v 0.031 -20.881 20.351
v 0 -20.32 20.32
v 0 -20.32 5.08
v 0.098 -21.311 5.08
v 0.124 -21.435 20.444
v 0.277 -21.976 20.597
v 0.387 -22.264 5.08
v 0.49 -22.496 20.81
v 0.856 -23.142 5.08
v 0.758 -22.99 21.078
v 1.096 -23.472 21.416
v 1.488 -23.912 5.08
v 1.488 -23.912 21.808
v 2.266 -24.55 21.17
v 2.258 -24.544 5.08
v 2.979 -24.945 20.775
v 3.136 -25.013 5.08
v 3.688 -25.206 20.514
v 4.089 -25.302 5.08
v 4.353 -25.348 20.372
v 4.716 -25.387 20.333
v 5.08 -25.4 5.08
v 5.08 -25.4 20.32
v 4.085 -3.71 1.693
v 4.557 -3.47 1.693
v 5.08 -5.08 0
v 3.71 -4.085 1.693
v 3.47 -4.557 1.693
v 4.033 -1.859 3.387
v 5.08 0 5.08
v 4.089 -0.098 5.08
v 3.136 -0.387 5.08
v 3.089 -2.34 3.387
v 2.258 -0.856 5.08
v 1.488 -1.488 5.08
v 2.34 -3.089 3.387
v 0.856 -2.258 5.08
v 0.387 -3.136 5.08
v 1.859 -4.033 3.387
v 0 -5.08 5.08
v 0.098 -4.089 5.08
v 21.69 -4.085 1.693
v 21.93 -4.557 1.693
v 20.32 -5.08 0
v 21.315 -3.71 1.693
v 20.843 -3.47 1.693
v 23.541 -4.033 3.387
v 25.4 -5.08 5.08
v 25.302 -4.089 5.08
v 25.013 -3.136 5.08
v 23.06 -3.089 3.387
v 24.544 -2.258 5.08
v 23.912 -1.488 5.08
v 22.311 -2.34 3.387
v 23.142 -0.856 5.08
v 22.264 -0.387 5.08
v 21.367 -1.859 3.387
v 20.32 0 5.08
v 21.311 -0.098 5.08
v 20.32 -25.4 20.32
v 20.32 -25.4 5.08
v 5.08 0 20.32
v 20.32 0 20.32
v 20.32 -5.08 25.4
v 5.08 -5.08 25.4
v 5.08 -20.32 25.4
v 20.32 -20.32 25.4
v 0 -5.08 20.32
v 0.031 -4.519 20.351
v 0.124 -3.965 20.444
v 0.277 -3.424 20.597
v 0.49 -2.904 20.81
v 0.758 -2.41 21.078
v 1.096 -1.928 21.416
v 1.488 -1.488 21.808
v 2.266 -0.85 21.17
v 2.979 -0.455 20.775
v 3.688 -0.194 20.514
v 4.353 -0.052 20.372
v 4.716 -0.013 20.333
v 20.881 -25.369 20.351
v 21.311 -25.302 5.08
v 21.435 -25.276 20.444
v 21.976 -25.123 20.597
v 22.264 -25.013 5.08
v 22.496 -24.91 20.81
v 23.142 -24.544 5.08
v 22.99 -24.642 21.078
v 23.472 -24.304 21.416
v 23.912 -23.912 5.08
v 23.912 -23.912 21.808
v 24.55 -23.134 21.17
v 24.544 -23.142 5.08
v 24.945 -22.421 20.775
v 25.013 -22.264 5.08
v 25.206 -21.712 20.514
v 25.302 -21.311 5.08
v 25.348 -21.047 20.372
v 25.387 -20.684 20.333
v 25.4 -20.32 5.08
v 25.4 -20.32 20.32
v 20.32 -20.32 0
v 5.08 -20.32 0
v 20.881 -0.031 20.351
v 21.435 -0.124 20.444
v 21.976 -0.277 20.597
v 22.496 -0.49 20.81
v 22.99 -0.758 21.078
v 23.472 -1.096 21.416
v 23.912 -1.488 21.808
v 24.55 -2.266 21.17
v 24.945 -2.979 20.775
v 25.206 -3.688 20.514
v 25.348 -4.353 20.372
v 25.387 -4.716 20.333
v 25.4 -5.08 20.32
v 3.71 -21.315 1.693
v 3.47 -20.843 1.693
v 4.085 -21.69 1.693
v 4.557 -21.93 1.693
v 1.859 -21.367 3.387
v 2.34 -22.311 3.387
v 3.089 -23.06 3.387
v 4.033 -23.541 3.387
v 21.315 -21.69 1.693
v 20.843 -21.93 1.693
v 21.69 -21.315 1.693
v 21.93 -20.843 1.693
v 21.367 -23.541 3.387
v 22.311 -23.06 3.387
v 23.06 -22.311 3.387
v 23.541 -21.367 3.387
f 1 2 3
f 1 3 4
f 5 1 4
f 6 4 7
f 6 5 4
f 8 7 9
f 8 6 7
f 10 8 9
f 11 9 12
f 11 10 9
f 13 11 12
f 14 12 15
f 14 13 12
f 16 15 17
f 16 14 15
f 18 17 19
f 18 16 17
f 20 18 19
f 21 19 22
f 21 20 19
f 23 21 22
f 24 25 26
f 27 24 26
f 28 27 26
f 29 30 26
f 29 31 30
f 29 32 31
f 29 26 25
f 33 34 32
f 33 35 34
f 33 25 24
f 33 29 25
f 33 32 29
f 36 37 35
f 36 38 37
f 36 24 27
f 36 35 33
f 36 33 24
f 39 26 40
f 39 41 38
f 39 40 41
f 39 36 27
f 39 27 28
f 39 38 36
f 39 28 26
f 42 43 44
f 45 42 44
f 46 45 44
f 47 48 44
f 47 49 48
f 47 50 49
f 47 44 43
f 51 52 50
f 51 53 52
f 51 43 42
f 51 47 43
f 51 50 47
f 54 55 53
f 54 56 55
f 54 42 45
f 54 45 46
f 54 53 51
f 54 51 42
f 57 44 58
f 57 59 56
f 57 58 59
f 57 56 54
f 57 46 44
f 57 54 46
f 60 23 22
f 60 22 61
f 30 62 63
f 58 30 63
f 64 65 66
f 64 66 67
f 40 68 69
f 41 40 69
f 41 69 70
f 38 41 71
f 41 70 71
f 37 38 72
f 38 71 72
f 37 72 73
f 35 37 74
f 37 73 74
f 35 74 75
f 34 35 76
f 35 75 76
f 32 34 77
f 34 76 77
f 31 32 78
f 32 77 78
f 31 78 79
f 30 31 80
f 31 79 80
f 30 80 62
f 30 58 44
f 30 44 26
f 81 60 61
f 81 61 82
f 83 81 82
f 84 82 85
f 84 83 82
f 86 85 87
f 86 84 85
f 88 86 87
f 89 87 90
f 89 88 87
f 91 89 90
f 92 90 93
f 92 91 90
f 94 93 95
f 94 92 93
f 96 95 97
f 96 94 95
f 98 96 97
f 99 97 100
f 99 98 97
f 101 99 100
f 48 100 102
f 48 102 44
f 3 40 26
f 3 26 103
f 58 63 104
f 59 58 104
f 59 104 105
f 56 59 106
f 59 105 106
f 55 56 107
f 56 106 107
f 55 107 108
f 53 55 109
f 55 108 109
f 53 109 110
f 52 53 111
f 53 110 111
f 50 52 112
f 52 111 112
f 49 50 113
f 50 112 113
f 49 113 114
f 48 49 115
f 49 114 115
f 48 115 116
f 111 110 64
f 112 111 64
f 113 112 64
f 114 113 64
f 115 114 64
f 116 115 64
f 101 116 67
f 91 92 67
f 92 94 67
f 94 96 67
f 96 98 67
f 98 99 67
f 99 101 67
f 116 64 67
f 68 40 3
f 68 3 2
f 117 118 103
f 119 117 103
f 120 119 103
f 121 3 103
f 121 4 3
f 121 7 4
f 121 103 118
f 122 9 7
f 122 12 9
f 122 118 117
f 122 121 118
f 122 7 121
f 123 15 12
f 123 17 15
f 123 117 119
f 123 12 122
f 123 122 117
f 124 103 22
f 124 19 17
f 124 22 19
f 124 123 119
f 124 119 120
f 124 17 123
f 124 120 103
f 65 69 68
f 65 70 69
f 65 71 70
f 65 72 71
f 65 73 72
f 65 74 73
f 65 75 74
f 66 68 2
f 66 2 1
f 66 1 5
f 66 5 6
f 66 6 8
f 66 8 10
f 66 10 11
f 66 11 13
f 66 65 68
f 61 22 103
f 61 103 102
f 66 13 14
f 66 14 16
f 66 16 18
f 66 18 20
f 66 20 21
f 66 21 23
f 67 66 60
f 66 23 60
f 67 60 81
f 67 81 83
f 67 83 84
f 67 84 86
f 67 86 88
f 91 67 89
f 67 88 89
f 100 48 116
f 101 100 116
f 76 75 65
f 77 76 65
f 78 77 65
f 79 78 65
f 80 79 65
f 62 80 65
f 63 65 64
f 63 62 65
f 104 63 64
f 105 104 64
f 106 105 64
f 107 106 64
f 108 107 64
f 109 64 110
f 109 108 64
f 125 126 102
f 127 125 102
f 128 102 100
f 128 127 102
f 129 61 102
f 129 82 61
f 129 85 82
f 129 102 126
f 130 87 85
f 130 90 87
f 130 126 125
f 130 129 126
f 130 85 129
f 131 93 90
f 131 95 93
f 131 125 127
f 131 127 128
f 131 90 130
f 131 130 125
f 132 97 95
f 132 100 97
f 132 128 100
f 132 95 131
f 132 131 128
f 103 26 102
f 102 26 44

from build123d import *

# Parameters (mm, degrees)
F0_W     = 25.4
F0_H     = 25.4
F1_DEPTH = 25.4
F2_SIZE  = 5.08
F3_R     = 5.08
F4_SIZE  = 5.07999


# Not quite as in the source:
# - a fillet or chamfer is up to 0.001 mm smaller than in the source, because OpenCascade refuses the exact size


with BuildPart() as f1:
    # F0 (on Front) → F1 (new body)
    with BuildSketch(Plane.XZ):
        with Locations((12.7, 12.7)):
            Rectangle(F0_W, F0_H)
    extrude(amount=F1_DEPTH)

    # F2
    f2_edges = [f1.edges().sort_by_distance(p)[0] for p in [
        (25.4, -12.7, 25.4),
        (12.7, -25.4, 25.4),
        (12.7, 0, 25.4),
        (0, -12.7, 25.4),
    ]]
    chamfer(f2_edges, length=F2_SIZE)

    # F3
    f3_edges = [f1.edges().sort_by_distance(p)[0] for p in [
        (25.4, -25.4, 10.16),
        (25.4, 0, 10.16),
        (0, -25.4, 10.16),
        (0, 0, 10.16),
    ]]
    fillet(f3_edges, radius=F3_R)

    # F4 (size 5.08 in the source; OpenCascade refuses exactly that, so slightly less here)
    f4_edges = [f1.edges().sort_by_distance(p)[0] for p in [
        (12.7, -25.4, 0),
    ]]
    chamfer(f4_edges, length=F4_SIZE)


solid = f1.part
